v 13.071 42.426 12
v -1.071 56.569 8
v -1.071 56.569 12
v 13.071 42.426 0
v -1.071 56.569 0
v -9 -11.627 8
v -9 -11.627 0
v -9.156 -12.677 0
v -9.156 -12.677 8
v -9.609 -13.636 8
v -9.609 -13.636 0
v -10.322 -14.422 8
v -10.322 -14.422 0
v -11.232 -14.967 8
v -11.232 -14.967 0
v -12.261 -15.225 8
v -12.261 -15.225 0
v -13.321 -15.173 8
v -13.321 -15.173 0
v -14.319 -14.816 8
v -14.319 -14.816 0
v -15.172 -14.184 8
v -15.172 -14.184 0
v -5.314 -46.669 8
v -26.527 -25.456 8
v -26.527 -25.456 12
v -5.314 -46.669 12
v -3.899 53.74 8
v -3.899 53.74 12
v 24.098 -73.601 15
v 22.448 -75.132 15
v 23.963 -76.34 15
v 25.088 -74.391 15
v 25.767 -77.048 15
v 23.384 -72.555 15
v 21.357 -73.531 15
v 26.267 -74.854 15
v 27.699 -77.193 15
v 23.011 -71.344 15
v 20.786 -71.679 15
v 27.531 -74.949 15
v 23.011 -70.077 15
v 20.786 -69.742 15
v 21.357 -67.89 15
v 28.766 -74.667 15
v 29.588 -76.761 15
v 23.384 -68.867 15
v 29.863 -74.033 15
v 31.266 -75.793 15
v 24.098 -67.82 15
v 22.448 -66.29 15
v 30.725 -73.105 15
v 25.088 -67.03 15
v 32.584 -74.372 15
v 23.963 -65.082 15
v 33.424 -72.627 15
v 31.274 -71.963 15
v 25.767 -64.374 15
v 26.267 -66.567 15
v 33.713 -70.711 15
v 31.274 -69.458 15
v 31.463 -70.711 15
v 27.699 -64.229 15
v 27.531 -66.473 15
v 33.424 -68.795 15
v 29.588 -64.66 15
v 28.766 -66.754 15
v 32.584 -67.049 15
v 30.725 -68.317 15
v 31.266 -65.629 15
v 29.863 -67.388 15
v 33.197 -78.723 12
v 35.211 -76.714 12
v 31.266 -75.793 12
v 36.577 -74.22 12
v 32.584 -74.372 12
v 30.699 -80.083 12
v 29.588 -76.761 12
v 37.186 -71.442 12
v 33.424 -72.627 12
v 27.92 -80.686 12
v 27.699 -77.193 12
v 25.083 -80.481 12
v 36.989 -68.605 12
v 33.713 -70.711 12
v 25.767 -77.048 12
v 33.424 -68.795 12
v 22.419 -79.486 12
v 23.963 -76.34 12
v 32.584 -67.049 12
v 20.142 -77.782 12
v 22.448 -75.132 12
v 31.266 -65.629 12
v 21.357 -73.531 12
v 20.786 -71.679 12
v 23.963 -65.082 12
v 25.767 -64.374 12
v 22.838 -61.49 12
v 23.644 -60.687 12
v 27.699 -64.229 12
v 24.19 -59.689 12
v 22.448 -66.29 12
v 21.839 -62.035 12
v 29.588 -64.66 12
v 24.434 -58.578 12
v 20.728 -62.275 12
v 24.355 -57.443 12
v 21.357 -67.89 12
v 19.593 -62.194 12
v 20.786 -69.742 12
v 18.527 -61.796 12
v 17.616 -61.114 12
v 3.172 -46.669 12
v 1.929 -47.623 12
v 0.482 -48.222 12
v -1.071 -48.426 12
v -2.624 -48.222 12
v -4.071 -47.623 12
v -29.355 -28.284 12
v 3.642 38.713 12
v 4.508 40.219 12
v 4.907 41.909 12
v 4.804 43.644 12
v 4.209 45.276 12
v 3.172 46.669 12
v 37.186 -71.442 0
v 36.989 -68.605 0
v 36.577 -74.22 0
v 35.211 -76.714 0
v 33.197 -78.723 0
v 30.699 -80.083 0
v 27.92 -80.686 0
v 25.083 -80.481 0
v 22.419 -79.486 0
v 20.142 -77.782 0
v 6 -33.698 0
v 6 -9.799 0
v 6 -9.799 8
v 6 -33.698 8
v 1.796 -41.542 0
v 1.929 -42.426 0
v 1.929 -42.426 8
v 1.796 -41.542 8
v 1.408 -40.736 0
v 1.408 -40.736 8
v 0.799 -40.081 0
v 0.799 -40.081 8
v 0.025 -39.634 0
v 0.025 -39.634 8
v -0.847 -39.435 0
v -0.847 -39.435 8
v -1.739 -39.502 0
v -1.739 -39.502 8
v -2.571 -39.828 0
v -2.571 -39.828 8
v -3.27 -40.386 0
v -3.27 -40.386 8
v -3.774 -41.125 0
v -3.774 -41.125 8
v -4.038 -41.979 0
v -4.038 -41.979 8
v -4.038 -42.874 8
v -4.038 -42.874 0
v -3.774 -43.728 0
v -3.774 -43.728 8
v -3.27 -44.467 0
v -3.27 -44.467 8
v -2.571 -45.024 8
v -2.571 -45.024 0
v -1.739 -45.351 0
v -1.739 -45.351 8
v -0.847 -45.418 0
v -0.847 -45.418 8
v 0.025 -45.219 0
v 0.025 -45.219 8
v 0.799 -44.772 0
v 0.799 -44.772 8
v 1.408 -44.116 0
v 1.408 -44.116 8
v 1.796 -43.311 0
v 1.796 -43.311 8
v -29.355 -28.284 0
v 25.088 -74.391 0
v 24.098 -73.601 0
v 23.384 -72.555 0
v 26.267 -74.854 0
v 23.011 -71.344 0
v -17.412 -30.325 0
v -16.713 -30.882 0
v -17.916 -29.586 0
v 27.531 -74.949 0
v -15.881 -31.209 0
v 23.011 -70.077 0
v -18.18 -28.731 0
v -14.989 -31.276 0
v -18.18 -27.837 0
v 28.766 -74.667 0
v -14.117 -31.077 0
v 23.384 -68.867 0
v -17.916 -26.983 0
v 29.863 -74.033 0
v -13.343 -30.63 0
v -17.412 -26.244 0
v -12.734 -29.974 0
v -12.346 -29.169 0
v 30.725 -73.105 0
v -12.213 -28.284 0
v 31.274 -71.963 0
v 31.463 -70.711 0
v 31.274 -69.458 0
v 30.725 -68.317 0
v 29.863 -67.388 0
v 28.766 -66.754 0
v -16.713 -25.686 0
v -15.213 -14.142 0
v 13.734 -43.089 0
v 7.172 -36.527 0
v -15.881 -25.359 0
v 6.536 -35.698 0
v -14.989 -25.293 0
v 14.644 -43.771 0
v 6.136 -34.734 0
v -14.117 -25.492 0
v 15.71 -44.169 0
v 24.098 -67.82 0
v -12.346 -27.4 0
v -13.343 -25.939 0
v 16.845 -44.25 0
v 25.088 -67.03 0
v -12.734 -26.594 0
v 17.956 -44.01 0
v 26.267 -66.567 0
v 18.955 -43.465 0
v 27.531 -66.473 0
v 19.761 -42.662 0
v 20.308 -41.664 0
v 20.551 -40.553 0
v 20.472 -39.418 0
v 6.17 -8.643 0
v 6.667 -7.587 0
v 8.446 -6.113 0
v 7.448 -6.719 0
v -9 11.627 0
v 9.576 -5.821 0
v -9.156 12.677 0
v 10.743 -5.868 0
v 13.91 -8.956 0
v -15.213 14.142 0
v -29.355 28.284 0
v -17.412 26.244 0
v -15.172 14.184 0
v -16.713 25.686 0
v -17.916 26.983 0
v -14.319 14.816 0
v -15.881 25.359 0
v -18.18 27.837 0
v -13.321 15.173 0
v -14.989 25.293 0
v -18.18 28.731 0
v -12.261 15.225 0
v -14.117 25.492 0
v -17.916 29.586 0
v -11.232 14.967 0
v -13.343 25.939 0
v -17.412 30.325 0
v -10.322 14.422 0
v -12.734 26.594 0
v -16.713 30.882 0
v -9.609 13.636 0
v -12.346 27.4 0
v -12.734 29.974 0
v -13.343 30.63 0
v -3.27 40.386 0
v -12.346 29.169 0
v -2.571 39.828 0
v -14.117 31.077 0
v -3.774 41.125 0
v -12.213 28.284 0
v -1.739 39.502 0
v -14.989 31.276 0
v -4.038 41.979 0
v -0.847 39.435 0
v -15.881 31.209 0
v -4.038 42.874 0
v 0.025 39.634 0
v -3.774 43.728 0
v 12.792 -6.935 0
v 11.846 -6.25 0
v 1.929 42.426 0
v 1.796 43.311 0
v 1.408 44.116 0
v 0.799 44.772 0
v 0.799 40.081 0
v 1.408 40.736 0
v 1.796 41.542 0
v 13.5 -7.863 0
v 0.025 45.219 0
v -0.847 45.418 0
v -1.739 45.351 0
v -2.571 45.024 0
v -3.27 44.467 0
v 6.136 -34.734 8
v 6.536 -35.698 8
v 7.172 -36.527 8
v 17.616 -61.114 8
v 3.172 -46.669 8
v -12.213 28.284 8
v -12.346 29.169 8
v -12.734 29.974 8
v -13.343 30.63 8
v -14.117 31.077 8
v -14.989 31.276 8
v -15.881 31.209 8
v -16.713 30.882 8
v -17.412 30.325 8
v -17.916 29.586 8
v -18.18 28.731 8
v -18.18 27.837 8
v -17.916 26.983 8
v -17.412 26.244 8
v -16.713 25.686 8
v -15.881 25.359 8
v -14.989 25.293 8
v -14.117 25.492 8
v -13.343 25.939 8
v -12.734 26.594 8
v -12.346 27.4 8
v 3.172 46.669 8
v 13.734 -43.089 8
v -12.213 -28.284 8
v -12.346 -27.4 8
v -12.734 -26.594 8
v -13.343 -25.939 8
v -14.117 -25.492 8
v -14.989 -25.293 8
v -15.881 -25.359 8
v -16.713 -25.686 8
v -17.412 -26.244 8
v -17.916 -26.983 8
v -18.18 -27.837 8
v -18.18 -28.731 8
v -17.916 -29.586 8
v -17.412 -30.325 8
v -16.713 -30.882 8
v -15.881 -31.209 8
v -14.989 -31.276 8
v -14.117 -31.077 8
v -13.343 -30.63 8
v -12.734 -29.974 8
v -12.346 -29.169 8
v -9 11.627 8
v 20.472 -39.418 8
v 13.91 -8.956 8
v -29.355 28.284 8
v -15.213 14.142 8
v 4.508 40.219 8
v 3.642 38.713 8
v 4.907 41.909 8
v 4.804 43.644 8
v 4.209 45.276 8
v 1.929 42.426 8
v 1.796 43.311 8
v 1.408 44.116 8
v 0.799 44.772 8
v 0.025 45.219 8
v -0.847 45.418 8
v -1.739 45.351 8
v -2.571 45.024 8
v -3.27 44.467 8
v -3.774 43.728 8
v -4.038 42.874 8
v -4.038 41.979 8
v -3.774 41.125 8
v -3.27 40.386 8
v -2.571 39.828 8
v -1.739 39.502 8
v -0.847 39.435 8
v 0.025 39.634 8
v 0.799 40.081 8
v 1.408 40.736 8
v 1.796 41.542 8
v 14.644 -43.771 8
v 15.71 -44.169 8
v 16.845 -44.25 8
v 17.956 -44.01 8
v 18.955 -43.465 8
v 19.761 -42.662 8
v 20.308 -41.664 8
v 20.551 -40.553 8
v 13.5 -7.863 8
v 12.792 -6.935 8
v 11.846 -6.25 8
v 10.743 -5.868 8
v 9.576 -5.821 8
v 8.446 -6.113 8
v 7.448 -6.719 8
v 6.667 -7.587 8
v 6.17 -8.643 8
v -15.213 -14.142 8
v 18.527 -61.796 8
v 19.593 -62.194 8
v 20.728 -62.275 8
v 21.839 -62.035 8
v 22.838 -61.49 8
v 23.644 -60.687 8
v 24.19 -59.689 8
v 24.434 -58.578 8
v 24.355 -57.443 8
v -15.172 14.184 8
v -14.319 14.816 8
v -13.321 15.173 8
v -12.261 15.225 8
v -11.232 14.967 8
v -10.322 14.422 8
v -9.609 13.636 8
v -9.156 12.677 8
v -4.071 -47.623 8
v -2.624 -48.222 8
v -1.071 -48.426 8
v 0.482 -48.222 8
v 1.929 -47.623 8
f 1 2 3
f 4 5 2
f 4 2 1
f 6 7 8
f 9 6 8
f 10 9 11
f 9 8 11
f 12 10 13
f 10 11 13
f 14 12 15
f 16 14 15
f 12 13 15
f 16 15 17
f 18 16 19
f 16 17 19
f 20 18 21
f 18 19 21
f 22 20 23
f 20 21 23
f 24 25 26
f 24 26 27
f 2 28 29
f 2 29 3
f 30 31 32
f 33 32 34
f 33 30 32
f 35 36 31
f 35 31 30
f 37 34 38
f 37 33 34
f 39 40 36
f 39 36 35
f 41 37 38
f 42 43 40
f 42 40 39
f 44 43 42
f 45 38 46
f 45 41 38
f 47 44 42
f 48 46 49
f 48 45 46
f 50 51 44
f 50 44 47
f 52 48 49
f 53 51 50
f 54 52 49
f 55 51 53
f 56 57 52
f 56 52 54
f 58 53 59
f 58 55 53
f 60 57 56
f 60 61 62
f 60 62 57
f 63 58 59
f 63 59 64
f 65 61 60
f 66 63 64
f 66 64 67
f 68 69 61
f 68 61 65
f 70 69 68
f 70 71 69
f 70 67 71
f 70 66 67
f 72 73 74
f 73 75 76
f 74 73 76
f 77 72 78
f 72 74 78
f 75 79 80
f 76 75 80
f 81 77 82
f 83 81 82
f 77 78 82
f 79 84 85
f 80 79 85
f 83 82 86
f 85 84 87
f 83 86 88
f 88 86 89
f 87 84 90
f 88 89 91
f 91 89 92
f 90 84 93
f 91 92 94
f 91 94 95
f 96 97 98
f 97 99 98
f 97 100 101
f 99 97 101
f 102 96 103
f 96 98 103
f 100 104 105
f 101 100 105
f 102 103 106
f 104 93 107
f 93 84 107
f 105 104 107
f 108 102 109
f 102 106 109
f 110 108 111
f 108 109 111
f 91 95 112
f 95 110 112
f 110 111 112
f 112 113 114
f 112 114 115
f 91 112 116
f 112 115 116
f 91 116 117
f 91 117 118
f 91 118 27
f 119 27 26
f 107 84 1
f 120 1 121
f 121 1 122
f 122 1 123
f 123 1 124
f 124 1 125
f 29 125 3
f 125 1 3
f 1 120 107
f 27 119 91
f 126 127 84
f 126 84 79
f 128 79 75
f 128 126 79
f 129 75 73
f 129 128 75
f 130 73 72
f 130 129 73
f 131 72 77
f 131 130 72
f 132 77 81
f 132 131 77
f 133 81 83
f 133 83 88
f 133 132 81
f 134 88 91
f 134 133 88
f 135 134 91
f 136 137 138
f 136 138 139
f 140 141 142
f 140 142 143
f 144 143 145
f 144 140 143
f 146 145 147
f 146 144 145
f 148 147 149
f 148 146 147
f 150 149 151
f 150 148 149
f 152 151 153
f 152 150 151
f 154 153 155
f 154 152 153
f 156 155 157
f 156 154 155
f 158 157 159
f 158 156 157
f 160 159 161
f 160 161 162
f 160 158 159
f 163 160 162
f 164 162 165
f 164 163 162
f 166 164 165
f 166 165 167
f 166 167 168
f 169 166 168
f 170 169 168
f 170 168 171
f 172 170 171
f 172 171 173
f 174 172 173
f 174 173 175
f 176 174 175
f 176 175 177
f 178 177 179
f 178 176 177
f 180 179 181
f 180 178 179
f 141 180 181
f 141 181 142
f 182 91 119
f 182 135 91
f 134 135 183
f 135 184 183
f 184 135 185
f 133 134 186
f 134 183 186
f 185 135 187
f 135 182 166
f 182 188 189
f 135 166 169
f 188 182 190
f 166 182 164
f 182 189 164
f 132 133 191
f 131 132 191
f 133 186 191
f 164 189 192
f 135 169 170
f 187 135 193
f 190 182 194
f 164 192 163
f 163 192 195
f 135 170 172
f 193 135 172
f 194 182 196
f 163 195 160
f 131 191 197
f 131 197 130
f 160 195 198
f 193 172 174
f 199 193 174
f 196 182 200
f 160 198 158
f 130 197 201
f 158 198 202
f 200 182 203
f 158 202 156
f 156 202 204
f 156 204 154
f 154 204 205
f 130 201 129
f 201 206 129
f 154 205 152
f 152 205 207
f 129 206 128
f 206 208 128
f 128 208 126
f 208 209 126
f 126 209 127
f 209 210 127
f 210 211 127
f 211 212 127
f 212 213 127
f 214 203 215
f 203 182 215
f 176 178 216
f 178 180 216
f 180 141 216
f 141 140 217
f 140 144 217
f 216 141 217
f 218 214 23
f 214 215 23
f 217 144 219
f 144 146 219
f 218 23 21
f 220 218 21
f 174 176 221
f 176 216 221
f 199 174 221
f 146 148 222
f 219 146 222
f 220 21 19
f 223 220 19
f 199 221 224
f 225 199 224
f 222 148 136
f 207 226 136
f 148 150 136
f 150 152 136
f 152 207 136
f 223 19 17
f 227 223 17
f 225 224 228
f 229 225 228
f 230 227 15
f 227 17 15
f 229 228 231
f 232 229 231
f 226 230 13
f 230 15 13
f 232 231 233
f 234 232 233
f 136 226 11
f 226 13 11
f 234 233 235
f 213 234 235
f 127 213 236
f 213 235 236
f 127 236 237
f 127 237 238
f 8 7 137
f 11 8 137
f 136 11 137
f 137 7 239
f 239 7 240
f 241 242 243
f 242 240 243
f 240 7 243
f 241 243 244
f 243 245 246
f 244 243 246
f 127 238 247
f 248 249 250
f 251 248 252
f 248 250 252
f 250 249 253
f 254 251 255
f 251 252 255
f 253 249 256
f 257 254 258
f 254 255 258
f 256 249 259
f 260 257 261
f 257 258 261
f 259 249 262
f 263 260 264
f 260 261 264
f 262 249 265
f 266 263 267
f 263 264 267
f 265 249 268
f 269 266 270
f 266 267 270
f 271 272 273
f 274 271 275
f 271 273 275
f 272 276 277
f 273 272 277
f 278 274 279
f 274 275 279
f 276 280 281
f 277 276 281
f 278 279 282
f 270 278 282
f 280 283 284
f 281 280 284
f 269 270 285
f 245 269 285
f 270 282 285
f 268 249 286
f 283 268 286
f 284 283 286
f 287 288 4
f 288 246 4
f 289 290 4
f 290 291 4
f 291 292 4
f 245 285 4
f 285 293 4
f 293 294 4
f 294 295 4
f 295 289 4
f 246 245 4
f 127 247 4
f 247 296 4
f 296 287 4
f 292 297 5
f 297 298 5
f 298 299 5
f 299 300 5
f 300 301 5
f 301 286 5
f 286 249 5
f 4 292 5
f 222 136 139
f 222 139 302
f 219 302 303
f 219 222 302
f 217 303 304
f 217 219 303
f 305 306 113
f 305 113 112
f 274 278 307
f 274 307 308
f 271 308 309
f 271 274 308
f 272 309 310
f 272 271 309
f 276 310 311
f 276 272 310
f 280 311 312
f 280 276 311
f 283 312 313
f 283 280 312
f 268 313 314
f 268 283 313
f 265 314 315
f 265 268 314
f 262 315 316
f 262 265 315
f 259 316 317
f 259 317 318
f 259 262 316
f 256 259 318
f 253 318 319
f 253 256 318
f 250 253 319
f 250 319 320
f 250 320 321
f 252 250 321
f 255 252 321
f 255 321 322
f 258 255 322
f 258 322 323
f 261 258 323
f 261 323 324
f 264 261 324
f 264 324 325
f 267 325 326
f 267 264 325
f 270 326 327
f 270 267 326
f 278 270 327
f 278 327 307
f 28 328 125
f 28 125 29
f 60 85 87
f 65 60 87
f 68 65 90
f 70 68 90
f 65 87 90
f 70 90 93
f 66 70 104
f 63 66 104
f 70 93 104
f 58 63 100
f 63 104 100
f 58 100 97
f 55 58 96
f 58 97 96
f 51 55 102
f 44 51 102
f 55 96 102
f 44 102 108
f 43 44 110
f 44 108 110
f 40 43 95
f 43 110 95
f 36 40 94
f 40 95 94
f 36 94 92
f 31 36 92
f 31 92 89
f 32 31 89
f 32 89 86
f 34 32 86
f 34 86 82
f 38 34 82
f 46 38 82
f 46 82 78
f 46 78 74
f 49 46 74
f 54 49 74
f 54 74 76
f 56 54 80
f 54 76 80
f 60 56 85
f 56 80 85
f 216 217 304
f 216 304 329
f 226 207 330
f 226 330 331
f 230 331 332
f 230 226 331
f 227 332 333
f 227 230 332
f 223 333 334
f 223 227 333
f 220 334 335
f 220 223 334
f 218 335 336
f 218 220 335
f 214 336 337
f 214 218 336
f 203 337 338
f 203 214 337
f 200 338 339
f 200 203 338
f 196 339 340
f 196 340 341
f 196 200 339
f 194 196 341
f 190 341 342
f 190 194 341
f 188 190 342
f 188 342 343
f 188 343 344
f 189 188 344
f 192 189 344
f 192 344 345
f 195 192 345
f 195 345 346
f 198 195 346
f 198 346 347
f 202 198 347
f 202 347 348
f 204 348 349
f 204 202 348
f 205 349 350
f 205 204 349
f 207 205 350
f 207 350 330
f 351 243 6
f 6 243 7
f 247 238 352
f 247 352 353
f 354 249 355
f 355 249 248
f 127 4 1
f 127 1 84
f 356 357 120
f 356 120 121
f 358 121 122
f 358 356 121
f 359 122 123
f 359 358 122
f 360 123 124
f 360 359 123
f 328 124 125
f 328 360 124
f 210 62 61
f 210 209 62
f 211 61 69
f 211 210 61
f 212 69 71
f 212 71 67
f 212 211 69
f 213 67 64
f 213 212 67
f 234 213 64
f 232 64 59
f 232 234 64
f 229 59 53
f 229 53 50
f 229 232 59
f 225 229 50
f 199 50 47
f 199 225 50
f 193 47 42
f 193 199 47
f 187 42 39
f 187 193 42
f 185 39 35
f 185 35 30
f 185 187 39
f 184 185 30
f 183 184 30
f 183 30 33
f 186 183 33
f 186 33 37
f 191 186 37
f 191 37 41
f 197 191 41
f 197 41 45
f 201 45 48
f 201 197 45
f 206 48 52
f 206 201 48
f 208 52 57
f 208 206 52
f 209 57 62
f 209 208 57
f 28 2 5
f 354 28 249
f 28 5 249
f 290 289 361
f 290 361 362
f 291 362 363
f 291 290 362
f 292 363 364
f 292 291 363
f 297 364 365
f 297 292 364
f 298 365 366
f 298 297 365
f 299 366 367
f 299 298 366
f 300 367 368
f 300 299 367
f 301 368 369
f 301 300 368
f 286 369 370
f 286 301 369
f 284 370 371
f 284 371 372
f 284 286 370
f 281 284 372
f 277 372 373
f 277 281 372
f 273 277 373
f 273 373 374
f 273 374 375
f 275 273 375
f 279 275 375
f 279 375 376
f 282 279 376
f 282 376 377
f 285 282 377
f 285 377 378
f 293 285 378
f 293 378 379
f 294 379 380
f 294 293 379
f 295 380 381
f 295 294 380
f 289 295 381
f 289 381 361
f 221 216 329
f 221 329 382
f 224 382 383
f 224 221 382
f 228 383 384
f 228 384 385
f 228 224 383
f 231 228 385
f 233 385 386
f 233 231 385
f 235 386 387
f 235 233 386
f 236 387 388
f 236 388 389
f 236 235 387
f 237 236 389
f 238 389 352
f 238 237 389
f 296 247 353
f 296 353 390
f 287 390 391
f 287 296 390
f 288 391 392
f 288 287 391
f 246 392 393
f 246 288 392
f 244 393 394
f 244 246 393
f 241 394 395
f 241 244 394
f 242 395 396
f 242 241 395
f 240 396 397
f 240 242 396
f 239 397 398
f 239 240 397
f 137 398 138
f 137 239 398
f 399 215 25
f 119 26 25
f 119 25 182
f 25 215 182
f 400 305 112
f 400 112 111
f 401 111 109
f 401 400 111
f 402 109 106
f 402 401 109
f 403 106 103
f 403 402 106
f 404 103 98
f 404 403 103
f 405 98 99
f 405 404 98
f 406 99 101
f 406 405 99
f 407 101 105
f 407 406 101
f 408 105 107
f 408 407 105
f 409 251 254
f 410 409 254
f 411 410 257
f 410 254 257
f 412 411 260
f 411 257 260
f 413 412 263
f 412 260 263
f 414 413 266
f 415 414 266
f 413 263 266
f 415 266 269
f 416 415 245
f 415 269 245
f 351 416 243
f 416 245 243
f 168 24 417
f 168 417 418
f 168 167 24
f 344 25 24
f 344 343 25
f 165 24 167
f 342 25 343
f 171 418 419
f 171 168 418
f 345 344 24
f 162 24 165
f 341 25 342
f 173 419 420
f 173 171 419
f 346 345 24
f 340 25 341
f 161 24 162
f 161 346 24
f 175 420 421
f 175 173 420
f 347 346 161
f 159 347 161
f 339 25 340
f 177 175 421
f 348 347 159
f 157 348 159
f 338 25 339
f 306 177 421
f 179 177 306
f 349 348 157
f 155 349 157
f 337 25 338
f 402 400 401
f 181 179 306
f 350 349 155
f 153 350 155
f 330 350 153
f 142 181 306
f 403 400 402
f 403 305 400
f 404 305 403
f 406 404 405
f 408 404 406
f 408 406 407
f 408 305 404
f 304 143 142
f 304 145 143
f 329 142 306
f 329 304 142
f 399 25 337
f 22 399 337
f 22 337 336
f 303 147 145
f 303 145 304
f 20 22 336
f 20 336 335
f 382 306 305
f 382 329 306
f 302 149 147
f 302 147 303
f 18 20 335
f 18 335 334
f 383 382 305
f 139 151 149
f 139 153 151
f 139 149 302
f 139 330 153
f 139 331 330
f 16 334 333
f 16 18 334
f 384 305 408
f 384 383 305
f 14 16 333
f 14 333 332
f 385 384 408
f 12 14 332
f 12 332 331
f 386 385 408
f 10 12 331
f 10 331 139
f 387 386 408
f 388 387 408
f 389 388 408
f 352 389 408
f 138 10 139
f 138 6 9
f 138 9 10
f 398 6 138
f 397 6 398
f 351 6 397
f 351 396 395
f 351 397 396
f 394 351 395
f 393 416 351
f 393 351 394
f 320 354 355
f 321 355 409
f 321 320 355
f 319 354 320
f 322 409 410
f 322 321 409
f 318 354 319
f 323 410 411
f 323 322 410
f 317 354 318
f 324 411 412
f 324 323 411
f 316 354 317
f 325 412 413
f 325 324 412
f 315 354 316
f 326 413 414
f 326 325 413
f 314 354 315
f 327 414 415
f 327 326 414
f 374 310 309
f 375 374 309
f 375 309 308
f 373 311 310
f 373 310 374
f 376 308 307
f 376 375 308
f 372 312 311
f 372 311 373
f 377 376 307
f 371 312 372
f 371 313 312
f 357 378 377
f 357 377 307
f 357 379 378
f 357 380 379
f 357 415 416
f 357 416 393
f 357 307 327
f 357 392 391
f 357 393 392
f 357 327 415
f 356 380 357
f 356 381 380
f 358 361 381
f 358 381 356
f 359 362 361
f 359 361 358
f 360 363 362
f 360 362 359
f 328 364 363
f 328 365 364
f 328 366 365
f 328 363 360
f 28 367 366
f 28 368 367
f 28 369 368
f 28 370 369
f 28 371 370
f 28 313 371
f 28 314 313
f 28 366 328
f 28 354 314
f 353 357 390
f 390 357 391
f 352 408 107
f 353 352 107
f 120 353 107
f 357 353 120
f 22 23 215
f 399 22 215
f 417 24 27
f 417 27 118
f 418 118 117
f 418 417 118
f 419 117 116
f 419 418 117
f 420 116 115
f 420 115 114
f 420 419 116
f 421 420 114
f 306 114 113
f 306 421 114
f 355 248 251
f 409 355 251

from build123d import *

# Parameters (mm, degrees)
SKETCH1_R           = 3
SKETCH1_R_2         = 4.25
BOSS_EXTRUDE1_DEPTH = 8
SKETCH2_R           = 4.25
BOSS_EXTRUDE2_DEPTH = 4
SKETCH3_R           = 6.5
SKETCH3_R_2         = 4.25
BOSS_EXTRUDE3_DEPTH = 3


with BuildPart() as part:
    # Sketch1 → Boss-Extrude1 (new body)
    with BuildSketch(Plane.XY):
        with BuildLine():
            Line((-15.213203436, 14.142135624), (-15.171572875, 14.183766184))
            ThreePointArc((-15.171572875, 14.183766184), (-11.231737479, 14.96744817), (-9, 11.627416998))
            Line((-9, 11.627416998), (-9, -11.627416998))
            ThreePointArc((-9, -11.627416998), (-11.231737479, -14.96744817), (-15.171572875, -14.183766184))
            Line((-15.171572875, -14.183766184), (-15.213203436, -14.142135624))
            Line((-15.213203436, -14.142135624), (-29.355339059, -28.284271247))
            Line((-29.355339059, -28.284271247), (20.142135624, -77.781745931))
            ThreePointArc((20.142135624, -77.781745931), (31.996800536, -79.492317987), (36.988958333, -68.60482528))
            Line((36.988958333, -68.60482528), (13.071067812, 42.426406871))
            Line((13.071067812, 42.426406871), (-1.071067812, 56.568542495))
            Line((-1.071067812, 56.568542495), (-29.355339059, 28.284271247))
            Line((-29.355339059, 28.284271247), (-15.213203436, 14.142135624))
        make_face()
        with Locations((-1.071067812, 42.426406871)):
            Circle(SKETCH1_R, mode=Mode.SUBTRACT)
        with Locations((-15.213203436, 28.284271247)):
            Circle(SKETCH1_R, mode=Mode.SUBTRACT)
        with Locations((-15.213203436, -28.284271247)):
            Circle(SKETCH1_R, mode=Mode.SUBTRACT)
        with Locations((-1.071067812, -42.426406871)):
            Circle(SKETCH1_R, mode=Mode.SUBTRACT)
        with Locations((27.213203436, -70.710678119)):
            Circle(SKETCH1_R_2, mode=Mode.SUBTRACT)
        with BuildLine():
            Line((6, -9.798512067), (6, -33.69848481))
            ThreePointArc((6, -33.69848481), (6.30448187, -35.229218539), (7.171572875, -36.526911935))
            Line((7.171572875, -36.526911935), (13.733563505, -43.088902565))
            ThreePointArc((13.733563505, -43.088902565), (18.47542947, -43.773131388), (20.472292589, -39.418134305))
            Line((20.472292589, -39.418134305), (13.910301959, -8.956170931))
            ThreePointArc((13.910301959, -8.956170931), (9.576448254, -5.820999789), (6, -9.798512067))
        make_face(mode=Mode.SUBTRACT)
    extrude(amount=BOSS_EXTRUDE1_DEPTH)

    # Sketch2 → Boss-Extrude2 (add)
    with BuildSketch(Plane.XY.offset(8)):
        with BuildLine():
            Line((24.355165698, -57.443143037), (3.641635622, 38.712860541))
            ThreePointArc((3.641635622, 38.712860541), (4.918487685, 42.780278254), (3.171572875, 46.669047558))
            Line((3.171572875, 46.669047558), (-3.899494937, 53.74011537))
            Line((-3.899494937, 53.74011537), (-1.071067812, 56.568542495))
            Line((-1.071067812, 56.568542495), (13.071067812, 42.426406871))
            Line((13.071067812, 42.426406871), (36.988958333, -68.60482528))
            ThreePointArc((36.988958333, -68.60482528), (31.996800536, -79.492317987), (20.142135624, -77.781745931))
            Line((20.142135624, -77.781745931), (-29.355339059, -28.284271247))
            Line((-29.355339059, -28.284271247), (-26.526911935, -25.455844123))
            Line((-26.526911935, -25.455844123), (-5.313708499, -46.669047558))
            ThreePointArc((-5.313708499, -46.669047558), (-1.071067812, -48.426406871), (3.171572875, -46.669047558))
            Line((3.171572875, -46.669047558), (17.616436614, -61.113911297))
            ThreePointArc((17.616436614, -61.113911297), (22.358302578, -61.79814012), (24.355165698, -57.443143037))
        make_face()
        with Locations((27.213203436, -70.710678119)):
            Circle(SKETCH2_R, mode=Mode.SUBTRACT)
    extrude(amount=BOSS_EXTRUDE2_DEPTH)

    # Sketch3 → Boss-Extrude3 (add)
    with BuildSketch(Plane.XY.offset(12)):
        with Locations((27.213203436, -70.710678119)):
            Circle(SKETCH3_R)
        with Locations((27.213203436, -70.710678119)):
            Circle(SKETCH3_R_2, mode=Mode.SUBTRACT)
    extrude(amount=BOSS_EXTRUDE3_DEPTH)


solid = part.part
